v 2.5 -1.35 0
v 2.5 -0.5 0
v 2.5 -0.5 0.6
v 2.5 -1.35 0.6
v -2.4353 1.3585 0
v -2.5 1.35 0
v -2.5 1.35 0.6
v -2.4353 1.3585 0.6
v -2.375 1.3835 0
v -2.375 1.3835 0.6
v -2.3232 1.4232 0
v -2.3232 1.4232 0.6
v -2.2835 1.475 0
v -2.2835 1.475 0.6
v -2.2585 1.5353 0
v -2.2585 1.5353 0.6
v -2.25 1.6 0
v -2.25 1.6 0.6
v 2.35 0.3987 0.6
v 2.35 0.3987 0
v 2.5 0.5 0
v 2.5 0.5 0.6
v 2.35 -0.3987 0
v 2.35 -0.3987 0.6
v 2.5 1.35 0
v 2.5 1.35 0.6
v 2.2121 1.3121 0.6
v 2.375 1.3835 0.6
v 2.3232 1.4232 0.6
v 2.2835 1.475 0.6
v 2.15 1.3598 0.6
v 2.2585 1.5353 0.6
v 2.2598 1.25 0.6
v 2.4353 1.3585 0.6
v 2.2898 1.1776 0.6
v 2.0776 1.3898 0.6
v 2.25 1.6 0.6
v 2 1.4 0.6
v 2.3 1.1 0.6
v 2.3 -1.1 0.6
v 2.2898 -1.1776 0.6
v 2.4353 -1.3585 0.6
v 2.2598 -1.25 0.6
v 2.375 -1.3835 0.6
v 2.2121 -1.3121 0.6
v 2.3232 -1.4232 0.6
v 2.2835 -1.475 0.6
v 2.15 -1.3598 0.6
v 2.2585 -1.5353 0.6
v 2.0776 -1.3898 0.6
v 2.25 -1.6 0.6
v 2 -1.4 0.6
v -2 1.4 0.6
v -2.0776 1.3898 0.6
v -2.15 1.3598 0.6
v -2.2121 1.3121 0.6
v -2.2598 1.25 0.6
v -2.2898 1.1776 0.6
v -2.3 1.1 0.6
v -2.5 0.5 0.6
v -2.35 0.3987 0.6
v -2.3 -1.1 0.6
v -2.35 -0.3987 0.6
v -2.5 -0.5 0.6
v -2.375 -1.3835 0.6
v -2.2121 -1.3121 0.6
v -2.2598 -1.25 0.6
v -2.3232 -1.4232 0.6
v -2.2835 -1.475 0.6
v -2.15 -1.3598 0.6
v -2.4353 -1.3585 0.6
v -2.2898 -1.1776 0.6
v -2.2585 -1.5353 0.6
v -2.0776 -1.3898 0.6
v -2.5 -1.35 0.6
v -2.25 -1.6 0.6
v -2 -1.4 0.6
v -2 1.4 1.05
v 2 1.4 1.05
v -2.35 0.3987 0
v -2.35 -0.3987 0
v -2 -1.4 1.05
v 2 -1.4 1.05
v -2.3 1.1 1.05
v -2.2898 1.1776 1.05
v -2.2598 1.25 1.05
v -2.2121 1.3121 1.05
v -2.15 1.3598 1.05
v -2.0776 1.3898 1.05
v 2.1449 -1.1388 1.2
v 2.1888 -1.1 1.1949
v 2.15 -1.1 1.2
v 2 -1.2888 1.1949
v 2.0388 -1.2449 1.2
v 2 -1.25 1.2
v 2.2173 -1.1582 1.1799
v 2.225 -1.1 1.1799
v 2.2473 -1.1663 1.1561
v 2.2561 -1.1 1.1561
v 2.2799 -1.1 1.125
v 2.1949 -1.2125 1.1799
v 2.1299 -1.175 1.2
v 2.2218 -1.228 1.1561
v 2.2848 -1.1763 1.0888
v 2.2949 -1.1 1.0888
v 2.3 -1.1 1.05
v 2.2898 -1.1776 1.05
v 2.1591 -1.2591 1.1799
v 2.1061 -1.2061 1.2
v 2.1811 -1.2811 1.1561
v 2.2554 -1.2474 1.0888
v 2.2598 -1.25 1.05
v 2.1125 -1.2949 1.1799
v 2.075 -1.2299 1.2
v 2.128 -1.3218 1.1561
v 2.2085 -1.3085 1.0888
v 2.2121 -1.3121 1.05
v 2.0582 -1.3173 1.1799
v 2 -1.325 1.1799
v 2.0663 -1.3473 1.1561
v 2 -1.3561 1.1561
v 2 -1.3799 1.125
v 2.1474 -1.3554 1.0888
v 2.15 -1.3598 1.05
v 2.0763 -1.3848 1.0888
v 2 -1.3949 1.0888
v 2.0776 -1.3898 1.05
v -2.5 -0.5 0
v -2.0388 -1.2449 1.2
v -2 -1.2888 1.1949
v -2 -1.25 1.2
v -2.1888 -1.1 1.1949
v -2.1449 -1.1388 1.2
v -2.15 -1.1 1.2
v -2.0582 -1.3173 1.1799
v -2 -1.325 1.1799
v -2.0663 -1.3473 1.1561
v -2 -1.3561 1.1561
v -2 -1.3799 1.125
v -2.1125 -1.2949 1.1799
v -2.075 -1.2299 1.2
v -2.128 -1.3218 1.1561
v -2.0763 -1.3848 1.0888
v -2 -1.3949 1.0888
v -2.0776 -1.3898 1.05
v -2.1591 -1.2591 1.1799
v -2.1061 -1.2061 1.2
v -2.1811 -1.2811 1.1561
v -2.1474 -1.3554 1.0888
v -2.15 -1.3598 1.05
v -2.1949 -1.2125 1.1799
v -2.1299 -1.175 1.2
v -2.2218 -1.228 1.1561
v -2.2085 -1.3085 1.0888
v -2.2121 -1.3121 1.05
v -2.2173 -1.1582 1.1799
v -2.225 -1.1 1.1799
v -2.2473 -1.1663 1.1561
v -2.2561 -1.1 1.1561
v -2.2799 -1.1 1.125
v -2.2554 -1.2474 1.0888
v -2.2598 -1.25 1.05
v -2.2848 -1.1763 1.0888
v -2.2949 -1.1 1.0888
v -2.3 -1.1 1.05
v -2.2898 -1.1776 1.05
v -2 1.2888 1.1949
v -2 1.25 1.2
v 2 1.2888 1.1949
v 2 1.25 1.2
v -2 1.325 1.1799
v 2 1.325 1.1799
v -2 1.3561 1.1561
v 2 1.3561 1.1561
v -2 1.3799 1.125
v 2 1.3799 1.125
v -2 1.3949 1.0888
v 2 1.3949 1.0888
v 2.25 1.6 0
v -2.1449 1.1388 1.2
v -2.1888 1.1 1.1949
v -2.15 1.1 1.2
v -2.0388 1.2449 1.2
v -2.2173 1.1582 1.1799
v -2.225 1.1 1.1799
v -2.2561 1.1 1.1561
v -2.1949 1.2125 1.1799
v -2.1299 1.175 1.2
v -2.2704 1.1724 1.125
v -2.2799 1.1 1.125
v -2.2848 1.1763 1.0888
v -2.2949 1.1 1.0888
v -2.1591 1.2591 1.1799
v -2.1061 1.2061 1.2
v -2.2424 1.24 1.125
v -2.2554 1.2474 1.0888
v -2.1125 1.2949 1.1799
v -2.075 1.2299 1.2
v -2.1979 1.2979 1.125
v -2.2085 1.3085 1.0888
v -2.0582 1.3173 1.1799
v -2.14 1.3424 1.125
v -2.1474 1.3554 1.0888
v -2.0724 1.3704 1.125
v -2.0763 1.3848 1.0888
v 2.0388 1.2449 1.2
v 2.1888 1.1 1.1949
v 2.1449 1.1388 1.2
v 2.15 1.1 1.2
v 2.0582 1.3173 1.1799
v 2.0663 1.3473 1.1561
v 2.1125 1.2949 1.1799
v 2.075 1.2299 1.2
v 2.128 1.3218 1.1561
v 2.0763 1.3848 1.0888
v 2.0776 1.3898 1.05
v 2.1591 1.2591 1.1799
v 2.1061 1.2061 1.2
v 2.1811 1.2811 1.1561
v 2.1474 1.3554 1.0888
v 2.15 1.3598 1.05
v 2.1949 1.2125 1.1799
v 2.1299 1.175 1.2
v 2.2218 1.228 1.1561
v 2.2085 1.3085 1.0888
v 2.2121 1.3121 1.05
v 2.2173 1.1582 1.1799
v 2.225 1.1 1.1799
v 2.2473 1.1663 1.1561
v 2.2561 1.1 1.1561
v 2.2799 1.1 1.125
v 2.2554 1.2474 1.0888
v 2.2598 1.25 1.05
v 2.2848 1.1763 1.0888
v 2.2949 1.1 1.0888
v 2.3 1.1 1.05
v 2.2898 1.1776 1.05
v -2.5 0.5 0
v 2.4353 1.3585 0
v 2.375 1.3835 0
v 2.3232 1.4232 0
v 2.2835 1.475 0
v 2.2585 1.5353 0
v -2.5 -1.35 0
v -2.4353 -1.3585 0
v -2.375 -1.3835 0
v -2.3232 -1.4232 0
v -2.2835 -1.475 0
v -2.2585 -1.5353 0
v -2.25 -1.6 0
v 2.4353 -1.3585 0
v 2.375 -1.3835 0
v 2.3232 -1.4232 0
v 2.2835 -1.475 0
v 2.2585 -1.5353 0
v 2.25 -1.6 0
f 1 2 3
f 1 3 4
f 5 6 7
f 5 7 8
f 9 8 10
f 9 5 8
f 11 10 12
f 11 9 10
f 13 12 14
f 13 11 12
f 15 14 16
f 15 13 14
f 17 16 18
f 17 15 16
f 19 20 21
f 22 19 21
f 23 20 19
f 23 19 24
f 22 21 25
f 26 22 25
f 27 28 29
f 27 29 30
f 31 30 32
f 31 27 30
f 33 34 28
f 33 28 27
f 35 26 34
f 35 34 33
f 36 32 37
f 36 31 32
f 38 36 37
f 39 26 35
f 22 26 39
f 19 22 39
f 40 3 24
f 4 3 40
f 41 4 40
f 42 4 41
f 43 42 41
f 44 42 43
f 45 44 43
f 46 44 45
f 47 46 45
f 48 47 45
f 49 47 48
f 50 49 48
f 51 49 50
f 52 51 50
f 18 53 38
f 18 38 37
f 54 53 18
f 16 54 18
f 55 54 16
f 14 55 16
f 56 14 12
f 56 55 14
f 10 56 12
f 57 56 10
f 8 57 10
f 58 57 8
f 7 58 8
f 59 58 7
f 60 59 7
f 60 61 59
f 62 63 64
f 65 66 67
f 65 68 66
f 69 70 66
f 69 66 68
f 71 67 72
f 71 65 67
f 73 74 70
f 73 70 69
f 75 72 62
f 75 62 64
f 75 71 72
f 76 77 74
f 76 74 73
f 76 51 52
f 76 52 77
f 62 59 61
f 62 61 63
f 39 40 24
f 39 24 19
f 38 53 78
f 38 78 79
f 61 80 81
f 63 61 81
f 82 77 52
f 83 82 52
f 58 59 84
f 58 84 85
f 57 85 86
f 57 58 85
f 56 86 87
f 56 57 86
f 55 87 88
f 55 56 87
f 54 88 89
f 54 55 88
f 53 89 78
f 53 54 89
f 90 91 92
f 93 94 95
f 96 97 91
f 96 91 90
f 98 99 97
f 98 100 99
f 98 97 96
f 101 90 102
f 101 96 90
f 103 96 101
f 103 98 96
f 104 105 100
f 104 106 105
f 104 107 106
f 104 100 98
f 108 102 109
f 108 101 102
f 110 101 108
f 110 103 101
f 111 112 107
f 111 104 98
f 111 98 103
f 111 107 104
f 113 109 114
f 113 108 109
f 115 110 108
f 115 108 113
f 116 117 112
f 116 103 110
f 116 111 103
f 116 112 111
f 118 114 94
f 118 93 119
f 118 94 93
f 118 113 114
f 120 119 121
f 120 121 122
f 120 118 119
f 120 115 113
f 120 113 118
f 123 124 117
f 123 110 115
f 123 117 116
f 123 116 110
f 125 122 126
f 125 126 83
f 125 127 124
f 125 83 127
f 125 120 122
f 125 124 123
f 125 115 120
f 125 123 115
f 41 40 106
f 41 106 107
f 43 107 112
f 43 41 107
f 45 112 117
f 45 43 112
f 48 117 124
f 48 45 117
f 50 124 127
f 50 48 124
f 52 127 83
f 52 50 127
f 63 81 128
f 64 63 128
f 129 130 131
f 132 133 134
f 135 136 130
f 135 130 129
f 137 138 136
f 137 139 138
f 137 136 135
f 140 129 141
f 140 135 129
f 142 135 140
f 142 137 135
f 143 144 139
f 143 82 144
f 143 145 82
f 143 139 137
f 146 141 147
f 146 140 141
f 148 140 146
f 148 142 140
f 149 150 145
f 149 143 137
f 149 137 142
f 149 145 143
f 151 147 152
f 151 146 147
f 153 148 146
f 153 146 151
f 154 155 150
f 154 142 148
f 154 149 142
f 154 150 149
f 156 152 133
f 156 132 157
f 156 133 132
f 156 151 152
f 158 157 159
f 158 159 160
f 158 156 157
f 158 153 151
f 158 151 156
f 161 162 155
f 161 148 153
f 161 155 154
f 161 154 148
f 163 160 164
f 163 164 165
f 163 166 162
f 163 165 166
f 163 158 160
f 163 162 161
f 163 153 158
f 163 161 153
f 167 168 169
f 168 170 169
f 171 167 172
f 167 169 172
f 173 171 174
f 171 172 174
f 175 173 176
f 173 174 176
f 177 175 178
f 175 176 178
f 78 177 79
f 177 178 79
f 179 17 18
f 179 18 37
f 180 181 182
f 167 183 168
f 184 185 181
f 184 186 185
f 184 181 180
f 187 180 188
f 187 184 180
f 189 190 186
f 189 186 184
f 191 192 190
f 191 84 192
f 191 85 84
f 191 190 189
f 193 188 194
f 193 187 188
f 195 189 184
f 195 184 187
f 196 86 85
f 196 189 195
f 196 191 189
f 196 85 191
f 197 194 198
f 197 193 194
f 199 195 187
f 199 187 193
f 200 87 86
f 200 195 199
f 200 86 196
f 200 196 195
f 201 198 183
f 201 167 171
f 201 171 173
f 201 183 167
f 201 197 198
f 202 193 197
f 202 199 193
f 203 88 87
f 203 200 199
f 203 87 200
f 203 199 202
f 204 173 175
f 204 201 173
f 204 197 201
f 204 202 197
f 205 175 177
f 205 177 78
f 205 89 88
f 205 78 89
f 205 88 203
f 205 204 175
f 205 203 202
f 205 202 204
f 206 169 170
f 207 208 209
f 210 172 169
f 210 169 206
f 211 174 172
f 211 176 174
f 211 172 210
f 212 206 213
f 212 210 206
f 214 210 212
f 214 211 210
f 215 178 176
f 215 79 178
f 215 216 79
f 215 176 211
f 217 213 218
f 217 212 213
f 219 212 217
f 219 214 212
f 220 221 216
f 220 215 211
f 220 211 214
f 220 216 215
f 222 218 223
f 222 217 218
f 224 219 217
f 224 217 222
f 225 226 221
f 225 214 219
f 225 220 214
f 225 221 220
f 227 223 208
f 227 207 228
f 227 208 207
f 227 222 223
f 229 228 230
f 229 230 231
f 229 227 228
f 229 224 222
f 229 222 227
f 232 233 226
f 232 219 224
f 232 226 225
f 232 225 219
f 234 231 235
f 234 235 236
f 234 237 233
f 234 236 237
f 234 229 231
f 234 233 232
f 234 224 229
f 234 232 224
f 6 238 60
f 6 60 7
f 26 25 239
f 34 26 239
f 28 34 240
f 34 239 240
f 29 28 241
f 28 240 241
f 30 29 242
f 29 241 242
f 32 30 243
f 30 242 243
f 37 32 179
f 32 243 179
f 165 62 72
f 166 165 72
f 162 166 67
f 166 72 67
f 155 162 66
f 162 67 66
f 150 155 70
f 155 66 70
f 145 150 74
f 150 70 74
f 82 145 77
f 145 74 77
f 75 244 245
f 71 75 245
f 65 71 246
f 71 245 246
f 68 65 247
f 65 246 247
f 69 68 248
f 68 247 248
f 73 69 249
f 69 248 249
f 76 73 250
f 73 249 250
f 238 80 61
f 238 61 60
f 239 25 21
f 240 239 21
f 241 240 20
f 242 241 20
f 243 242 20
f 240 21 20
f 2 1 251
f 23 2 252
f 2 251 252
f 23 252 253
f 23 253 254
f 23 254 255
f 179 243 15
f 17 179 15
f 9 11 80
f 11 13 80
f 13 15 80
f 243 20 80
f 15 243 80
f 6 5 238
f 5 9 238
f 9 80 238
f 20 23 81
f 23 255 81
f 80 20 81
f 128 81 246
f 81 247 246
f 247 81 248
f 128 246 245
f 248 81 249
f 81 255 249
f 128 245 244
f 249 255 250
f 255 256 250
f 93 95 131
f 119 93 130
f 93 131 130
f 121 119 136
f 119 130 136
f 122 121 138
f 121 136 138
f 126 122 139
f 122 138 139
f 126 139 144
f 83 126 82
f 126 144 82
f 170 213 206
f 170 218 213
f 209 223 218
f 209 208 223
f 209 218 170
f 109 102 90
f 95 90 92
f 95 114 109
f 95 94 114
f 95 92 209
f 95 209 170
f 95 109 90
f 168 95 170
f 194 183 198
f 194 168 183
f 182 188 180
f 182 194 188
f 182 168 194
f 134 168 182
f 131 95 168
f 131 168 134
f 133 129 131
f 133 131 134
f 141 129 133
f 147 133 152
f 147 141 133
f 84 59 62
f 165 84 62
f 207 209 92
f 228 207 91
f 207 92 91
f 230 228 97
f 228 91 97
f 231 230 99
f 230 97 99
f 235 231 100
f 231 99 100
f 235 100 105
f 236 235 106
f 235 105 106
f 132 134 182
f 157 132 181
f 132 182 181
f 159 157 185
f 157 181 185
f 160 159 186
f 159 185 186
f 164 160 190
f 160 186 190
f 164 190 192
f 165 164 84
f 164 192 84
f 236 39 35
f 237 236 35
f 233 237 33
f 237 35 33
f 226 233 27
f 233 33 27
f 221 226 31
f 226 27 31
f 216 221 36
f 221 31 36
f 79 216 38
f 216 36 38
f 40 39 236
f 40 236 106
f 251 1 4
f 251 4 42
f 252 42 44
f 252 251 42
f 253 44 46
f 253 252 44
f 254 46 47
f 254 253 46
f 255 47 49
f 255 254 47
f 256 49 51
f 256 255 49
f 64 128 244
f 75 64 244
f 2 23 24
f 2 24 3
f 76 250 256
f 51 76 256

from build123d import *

# Parameters (mm, degrees)
F1_DEPTH = 0.6
F3_DEPTH = 0.6
F6_R     = 0.15


with BuildPart() as f1:
    # F0 (on Top) → F1 (new body)
    with BuildSketch(Plane.XY):
        with BuildLine():
            Line((0, 1.6), (0, 0))
            Line((0, 0), (2.35, 0))
            Line((2.35, 0), (2.35, 0.398652))
            Line((2.35, 0.398652), (2.5, 0.5))
            Line((2.5, 0.5), (2.5, 1.35))
            ThreePointArc((2.5, 1.35), (2.323223, 1.423223), (2.25, 1.6))
            Line((2.25, 1.6), (0, 1.6))
        make_face()
    extrude(amount=F1_DEPTH)

    # F2 (on face) → F3 (join)
    with BuildSketch(Plane.XY.offset(0.6)):
        with BuildLine():
            Line((0, 1.4), (0, 0))
            Line((0, 0), (2.3, 0))
            Line((2.3, 0), (2.3, 1.1))
            ThreePointArc((2.3, 1.1), (2.212132, 1.312132), (2, 1.4))
            Line((2, 1.4), (0, 1.4))
        make_face()
    extrude(amount=F3_DEPTH)

    # F4: F1 across face


with BuildPart() as f1_1:
    add(f1.part)
    add(f1.part.mirror(Plane(origin=(0, 0.753333, 0.58), x_dir=(0, -1, 0), z_dir=(-1, 0, 0))))

    # F5: F1 across face


with BuildPart() as f1_2:
    add(f1_1.part)
    add(f1_1.part.mirror(Plane(origin=(0, 0, 0.596774), x_dir=(1, 0, 0), z_dir=(0, -1, 0))))

    # F6
    f6_edges = [f1_2.edges().sort_by_distance(p)[0] for p in [
        (0, 1.4, 1.2),
        (-2.212132, 1.312132, 1.2),
        (-2.3, 0, 1.2),
        (-2.212132, -1.312132, 1.2),
        (0, -1.4, 1.2),
        (2.212132, -1.312132, 1.2),
        (2.3, 0, 1.2),
        (2.212132, 1.312132, 1.2),
    ]]
    fillet(f6_edges, radius=F6_R)


solid = f1_2.part
